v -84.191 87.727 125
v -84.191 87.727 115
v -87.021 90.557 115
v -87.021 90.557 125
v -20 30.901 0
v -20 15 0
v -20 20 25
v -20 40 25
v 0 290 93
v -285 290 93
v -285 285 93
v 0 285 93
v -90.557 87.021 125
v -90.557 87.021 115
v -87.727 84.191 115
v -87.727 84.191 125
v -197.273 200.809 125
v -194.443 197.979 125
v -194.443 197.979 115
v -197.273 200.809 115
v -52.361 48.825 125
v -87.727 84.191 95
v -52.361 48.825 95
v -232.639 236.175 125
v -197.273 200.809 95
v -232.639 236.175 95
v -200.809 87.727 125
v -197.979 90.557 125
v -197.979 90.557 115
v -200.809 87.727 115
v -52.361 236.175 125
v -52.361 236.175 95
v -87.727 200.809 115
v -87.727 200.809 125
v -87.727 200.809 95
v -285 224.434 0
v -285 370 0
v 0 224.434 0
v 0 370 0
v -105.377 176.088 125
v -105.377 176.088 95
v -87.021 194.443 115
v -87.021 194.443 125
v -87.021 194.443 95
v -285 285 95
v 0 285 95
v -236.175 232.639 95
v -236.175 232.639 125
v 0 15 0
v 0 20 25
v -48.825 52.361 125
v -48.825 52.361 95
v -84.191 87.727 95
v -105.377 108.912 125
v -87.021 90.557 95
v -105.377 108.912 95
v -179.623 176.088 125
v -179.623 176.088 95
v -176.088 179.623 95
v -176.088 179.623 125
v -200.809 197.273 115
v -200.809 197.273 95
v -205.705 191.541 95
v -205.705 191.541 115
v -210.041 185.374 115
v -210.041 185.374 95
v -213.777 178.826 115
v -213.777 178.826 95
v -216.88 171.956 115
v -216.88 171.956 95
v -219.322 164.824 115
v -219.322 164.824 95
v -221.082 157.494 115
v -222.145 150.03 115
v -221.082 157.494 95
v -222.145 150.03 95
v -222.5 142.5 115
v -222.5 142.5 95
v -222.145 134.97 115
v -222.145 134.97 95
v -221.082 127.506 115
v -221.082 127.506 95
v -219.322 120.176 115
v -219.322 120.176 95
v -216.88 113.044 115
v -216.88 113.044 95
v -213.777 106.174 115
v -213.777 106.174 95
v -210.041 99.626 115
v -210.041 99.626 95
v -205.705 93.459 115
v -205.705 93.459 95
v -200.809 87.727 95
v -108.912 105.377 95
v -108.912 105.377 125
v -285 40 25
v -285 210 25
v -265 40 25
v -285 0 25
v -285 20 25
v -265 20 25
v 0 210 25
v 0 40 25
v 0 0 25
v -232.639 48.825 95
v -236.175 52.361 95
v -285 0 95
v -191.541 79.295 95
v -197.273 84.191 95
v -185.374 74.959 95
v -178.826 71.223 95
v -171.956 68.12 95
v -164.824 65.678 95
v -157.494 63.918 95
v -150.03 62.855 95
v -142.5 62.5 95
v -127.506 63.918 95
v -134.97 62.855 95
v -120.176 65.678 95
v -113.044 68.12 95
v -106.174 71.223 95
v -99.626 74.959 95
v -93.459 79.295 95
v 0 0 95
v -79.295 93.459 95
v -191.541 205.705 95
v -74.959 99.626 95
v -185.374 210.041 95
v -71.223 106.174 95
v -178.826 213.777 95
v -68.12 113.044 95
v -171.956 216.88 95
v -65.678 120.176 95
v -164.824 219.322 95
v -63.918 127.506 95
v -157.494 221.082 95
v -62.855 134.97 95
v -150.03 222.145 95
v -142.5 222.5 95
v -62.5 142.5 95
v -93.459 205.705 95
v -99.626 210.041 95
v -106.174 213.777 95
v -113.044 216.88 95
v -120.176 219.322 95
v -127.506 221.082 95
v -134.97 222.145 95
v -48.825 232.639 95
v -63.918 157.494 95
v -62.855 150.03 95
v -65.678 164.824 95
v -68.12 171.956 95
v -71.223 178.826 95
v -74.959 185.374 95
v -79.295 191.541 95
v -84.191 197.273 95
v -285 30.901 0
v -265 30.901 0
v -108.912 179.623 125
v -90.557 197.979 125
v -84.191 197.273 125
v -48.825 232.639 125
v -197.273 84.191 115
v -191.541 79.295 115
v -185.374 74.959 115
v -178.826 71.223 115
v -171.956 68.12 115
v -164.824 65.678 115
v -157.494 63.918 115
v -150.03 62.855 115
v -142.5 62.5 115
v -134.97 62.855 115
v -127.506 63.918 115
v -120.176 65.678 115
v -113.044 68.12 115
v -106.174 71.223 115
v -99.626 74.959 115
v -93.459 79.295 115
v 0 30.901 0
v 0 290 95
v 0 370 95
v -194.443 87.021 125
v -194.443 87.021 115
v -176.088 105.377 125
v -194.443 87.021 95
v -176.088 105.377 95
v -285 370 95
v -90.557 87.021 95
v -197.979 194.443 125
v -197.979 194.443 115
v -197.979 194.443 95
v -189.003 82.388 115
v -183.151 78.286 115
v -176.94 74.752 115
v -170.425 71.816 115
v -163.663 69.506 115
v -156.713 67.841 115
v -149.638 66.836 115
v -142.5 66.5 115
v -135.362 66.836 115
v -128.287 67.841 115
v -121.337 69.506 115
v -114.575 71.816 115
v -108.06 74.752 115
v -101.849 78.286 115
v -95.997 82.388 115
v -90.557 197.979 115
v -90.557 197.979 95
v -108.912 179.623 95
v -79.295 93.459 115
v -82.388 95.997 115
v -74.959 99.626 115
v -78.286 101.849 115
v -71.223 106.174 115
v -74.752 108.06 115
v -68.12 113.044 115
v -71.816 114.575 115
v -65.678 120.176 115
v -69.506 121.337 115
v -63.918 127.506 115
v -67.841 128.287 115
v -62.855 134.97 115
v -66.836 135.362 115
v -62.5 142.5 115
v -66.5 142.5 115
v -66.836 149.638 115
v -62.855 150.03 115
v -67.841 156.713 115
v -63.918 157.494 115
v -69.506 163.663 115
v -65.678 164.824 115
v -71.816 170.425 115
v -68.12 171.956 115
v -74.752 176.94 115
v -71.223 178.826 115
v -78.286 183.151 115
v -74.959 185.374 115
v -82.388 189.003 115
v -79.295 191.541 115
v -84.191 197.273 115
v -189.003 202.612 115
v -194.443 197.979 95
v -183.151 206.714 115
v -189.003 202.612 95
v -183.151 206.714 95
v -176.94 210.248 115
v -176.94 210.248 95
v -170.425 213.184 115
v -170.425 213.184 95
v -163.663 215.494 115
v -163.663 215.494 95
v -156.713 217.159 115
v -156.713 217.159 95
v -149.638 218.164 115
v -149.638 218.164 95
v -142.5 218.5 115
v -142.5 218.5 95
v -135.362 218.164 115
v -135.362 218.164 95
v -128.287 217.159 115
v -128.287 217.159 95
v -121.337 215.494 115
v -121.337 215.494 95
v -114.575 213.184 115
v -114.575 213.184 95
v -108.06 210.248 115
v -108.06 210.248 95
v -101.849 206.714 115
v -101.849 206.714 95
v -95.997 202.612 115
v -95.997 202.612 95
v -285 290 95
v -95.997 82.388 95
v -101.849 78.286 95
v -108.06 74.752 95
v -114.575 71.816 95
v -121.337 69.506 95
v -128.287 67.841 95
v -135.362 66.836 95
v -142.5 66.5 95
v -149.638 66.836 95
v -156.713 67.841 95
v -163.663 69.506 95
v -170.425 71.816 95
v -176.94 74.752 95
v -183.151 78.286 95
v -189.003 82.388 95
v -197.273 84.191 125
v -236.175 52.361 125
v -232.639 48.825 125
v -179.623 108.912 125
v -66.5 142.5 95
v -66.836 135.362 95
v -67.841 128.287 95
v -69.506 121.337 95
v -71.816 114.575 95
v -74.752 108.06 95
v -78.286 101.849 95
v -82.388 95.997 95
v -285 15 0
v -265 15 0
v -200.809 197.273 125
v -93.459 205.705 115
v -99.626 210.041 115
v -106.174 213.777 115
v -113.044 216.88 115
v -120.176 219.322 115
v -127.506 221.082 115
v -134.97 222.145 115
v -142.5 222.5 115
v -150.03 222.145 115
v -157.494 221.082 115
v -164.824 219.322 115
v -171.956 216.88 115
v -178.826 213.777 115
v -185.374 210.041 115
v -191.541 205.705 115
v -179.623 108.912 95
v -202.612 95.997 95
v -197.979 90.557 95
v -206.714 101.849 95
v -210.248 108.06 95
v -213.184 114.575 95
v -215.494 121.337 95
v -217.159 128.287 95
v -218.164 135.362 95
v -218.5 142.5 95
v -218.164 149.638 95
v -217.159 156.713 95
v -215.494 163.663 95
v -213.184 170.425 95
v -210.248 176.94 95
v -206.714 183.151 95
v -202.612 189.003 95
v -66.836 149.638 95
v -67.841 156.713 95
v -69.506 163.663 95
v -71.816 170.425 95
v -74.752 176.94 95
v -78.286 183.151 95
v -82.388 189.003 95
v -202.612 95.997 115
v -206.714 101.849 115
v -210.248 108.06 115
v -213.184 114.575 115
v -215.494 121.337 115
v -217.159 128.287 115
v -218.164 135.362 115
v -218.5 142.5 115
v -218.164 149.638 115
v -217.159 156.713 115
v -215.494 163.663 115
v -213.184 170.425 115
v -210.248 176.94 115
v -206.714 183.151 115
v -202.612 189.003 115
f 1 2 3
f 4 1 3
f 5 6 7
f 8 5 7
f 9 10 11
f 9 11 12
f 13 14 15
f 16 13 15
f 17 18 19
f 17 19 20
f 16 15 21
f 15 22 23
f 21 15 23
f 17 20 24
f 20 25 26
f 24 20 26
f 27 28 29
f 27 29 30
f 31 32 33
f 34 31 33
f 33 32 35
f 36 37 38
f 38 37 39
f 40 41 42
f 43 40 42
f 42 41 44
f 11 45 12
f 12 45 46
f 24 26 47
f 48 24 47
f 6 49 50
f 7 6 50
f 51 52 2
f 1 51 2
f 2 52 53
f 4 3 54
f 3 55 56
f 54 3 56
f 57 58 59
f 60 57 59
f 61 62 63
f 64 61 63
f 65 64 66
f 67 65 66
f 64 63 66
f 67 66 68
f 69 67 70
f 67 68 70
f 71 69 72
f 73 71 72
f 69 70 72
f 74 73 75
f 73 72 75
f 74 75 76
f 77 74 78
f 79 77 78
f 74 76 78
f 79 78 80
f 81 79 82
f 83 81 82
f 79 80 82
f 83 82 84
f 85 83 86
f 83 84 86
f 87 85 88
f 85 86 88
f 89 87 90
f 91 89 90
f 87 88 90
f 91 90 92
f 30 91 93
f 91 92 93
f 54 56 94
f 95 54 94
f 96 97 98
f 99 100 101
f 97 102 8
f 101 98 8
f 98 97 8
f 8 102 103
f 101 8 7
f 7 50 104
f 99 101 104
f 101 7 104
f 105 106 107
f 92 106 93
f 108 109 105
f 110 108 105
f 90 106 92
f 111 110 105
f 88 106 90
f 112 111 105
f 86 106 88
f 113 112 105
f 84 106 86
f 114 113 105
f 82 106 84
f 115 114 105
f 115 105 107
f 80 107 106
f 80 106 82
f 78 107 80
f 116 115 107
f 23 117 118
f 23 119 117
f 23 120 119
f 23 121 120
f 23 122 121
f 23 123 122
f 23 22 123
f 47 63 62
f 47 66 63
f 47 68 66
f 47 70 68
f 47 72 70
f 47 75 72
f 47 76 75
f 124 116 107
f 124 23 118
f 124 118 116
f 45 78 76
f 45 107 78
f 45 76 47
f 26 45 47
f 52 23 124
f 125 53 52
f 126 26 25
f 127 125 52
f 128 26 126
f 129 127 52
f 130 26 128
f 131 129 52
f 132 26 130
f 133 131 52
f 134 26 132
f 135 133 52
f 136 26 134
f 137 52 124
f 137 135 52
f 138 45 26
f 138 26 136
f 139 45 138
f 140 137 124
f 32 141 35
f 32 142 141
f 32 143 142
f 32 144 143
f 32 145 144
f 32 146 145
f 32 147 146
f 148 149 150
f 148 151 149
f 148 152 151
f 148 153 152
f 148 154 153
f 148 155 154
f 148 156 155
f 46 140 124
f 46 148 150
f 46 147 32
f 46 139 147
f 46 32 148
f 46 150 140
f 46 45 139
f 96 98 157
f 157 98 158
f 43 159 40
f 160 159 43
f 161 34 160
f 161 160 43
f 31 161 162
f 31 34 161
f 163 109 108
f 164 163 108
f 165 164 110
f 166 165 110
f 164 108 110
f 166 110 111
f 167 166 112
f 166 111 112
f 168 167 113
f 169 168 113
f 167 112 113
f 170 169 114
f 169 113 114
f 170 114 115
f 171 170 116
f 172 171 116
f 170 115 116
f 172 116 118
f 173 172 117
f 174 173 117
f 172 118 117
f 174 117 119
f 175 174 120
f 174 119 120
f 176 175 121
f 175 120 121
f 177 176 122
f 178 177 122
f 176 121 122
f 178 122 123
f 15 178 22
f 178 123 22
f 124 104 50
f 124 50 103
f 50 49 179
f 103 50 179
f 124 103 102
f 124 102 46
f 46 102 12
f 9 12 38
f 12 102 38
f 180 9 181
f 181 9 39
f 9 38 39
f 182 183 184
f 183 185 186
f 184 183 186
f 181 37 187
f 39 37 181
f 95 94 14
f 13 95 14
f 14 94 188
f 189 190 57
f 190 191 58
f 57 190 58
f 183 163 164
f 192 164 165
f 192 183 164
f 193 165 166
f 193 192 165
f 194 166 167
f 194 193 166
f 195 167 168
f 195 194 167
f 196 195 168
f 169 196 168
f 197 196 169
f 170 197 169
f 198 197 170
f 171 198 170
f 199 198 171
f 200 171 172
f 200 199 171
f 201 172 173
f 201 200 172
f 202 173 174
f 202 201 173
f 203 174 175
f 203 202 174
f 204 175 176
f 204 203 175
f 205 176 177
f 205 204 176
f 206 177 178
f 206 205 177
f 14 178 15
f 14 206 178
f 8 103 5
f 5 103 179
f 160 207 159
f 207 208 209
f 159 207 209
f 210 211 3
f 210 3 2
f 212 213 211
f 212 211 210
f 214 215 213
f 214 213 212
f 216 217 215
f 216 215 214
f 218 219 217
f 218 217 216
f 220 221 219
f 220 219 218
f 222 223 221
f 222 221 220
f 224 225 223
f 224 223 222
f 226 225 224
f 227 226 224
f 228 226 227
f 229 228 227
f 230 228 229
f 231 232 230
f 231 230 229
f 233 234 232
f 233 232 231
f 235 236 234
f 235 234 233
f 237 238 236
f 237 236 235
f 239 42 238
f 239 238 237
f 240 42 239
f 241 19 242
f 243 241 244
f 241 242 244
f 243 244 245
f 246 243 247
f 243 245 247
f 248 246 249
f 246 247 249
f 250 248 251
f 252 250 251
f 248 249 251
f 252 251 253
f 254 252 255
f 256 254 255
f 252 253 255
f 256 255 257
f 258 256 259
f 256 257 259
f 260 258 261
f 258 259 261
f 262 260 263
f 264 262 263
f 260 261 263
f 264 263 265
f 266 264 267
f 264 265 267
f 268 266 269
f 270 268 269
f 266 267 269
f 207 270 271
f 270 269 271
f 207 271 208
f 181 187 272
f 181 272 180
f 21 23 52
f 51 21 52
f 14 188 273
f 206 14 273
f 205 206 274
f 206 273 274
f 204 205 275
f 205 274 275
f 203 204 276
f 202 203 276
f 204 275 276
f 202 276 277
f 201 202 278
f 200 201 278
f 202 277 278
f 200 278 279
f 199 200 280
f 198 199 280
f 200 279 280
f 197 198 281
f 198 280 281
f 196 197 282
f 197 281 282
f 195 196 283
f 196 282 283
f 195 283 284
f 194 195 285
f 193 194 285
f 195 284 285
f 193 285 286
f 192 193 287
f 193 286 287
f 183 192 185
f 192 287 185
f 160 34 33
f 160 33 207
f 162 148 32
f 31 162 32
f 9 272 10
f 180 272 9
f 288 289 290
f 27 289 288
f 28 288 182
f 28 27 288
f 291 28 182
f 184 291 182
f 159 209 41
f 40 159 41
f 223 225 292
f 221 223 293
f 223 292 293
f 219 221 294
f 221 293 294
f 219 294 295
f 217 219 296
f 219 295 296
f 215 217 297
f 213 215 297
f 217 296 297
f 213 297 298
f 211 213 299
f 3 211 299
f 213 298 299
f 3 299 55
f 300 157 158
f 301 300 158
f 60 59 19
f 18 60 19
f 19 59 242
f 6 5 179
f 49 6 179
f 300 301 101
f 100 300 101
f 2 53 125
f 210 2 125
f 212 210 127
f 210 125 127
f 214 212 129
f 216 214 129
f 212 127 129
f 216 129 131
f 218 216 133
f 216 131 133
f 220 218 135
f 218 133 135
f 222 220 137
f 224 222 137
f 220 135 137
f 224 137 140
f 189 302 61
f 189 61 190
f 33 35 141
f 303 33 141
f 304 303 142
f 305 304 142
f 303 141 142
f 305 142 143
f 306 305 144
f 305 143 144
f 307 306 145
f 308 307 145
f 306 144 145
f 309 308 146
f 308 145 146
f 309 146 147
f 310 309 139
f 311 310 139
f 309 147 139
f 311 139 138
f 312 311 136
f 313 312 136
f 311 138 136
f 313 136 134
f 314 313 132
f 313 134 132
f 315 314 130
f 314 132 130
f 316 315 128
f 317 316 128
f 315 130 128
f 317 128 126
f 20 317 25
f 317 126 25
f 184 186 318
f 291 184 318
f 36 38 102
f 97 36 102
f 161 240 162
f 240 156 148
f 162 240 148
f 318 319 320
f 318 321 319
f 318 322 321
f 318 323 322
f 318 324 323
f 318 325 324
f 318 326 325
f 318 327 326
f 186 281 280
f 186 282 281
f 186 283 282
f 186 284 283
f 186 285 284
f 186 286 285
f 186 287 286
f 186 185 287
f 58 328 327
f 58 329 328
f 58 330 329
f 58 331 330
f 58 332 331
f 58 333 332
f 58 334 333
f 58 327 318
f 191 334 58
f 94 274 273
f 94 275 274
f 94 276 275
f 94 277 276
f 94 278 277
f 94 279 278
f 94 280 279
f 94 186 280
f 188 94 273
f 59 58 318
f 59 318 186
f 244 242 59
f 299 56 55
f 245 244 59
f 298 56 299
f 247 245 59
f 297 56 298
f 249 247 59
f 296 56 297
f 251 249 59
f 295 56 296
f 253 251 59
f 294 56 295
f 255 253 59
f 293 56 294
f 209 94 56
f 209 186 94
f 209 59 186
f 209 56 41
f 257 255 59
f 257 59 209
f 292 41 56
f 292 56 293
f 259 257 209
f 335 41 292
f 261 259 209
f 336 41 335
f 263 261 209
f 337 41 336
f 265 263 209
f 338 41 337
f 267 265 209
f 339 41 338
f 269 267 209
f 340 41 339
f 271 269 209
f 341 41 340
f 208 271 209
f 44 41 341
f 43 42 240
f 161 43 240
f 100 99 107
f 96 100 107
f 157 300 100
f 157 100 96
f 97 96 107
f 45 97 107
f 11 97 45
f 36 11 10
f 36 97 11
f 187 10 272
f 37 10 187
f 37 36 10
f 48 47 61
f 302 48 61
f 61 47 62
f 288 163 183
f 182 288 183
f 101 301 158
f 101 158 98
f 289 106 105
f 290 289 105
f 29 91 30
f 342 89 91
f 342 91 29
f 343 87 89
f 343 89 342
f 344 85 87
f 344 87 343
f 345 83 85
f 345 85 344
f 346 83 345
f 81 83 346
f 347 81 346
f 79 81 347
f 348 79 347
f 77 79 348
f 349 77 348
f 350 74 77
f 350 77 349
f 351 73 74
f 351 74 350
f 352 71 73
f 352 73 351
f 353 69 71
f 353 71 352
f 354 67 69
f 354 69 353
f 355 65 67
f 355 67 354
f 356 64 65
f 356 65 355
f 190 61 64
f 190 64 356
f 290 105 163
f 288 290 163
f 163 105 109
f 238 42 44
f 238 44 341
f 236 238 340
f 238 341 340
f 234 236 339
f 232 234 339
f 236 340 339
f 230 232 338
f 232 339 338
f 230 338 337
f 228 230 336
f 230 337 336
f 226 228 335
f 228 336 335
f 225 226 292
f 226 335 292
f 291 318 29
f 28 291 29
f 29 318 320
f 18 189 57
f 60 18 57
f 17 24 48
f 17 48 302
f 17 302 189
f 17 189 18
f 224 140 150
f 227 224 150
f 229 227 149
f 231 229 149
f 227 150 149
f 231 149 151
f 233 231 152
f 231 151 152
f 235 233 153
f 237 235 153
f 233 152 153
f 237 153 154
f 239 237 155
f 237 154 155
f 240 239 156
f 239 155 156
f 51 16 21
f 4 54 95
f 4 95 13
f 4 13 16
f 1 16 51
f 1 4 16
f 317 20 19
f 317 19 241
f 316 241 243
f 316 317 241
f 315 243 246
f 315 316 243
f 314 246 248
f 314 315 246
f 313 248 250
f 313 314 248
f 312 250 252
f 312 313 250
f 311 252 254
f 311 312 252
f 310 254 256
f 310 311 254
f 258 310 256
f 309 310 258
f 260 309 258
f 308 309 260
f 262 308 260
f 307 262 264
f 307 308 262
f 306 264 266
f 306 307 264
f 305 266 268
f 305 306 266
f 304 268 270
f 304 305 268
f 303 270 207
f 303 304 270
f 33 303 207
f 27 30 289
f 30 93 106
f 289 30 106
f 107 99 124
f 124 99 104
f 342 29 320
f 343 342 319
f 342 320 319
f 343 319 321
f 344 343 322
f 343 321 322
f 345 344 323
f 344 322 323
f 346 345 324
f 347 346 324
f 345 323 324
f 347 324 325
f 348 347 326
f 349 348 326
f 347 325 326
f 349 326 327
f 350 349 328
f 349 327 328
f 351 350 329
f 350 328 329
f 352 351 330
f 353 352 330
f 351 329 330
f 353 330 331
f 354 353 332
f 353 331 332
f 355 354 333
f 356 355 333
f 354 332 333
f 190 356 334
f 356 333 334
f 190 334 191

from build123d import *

# Parameters (mm, degrees)
F0_W      = 285
F0_H      = 370
F1_DEPTH  = 95
F2_W      = 285
F2_H      = 5
F3_DEPTH  = 2
F5_DEPTH  = 30
F6_DEPTH  = 20
F8_DEPTH  = 406
F9_W      = 245
F9_H      = 25
F10_DEPTH = 81


with BuildPart() as f1:
    # F0 (on Top) → F1 (new body)
    with BuildSketch(Plane.XY):
        with Locations((-142.5, 185)):
            Rectangle(F0_W, F0_H)
    extrude(amount=F1_DEPTH)

    # F2 (on face) → F3 (cut)
    with BuildSketch(Plane.XY.offset(95)):
        with Locations((-142.5, 287.5)):
            Rectangle(F2_W, F2_H)
    extrude(amount=-F3_DEPTH, mode=Mode.SUBTRACT)

    # F4 (on face) → F5 (join)
    with BuildSketch(Plane.XY.offset(95)):
        with BuildLine():
            Line((-232.6391152703, 48.8253508238), (-197.2731474365, 84.1913186575))
            ThreePointArc((-197.2731474365, 84.1913186575), (-199.0685424949, 85.9314575051), (-200.8086813425, 87.7268525635))
            Line((-200.8086813425, 87.7268525635), (-236.1746491762, 52.3608847297))
            Line((-236.1746491762, 52.3608847297), (-232.6391152703, 48.8253508238))
        make_face()
        with BuildLine():
            ThreePointArc((-200.8086813425, 87.7268525635), (-199.0685424949, 85.9314575051), (-197.2731474365, 84.1913186575))
            Line((-197.2731474365, 84.1913186575), (-194.4432654333, 87.0212006608))
            ThreePointArc((-194.4432654333, 87.0212006608), (-196.2401153702, 88.7598846298), (-197.9787993392, 90.5567345667))
            Line((-197.9787993392, 90.5567345667), (-200.8086813425, 87.7268525635))
        make_face()
        with BuildLine():
            ThreePointArc((-197.9787993392, 90.5567345667), (-196.2401153702, 88.7598846298), (-194.4432654333, 87.0212006608))
            Line((-194.4432654333, 87.0212006608), (-176.0875721064, 105.3768939877))
            Line((-176.0875721064, 105.3768939877), (-179.6231060123, 108.9124278936))
            Line((-179.6231060123, 108.9124278936), (-197.9787993392, 90.5567345667))
        make_face()
        with BuildLine():
            ThreePointArc((-90.5567345667, 87.0212006608), (-88.7598846298, 88.7598846298), (-87.0212006608, 90.5567345667))
            Line((-87.0212006608, 90.5567345667), (-105.3768939877, 108.9124278936))
            Line((-105.3768939877, 108.9124278936), (-108.9124278936, 105.3768939877))
            Line((-108.9124278936, 105.3768939877), (-90.5567345667, 87.0212006608))
        make_face()
        with BuildLine():
            ThreePointArc((-87.7268525635, 84.1913186575), (-85.9314575051, 85.9314575051), (-84.1913186575, 87.7268525635))
            Line((-84.1913186575, 87.7268525635), (-87.0212006608, 90.5567345667))
            ThreePointArc((-87.0212006608, 90.5567345667), (-88.7598846298, 88.7598846298), (-90.5567345667, 87.0212006608))
            Line((-90.5567345667, 87.0212006608), (-87.7268525635, 84.1913186575))
        make_face()
        with BuildLine():
            Line((-48.8253508238, 52.3608847297), (-84.1913186575, 87.7268525635))
            ThreePointArc((-84.1913186575, 87.7268525635), (-85.9314575051, 85.9314575051), (-87.7268525635, 84.1913186575))
            Line((-87.7268525635, 84.1913186575), (-52.3608847297, 48.8253508238))
            Line((-52.3608847297, 48.8253508238), (-48.8253508238, 52.3608847297))
        make_face()
        with BuildLine():
            ThreePointArc((-200.8086813425, 197.2731474365), (-199.0685424949, 199.0685424949), (-197.2731474365, 200.8086813425))
            Line((-197.2731474365, 200.8086813425), (-232.6391152703, 236.1746491762))
            Line((-232.6391152703, 236.1746491762), (-236.1746491762, 232.6391152703))
            Line((-236.1746491762, 232.6391152703), (-200.8086813425, 197.2731474365))
        make_face()
        with BuildLine():
            Line((-194.4432654333, 197.9787993392), (-197.2731474365, 200.8086813425))
            ThreePointArc((-197.2731474365, 200.8086813425), (-199.0685424949, 199.0685424949), (-200.8086813425, 197.2731474365))
            Line((-200.8086813425, 197.2731474365), (-197.9787993392, 194.4432654333))
            ThreePointArc((-197.9787993392, 194.4432654333), (-196.2401153702, 196.2401153702), (-194.4432654333, 197.9787993392))
        make_face()
        with BuildLine():
            Line((-176.0875721064, 179.6231060123), (-194.4432654333, 197.9787993392))
            ThreePointArc((-194.4432654333, 197.9787993392), (-196.2401153702, 196.2401153702), (-197.9787993392, 194.4432654333))
            Line((-197.9787993392, 194.4432654333), (-179.6231060123, 176.0875721064))
            Line((-179.6231060123, 176.0875721064), (-176.0875721064, 179.6231060123))
        make_face()
        with BuildLine():
            ThreePointArc((-87.7268525635, 200.8086813425), (-85.9314575051, 199.0685424949), (-84.1913186575, 197.2731474365))
            Line((-84.1913186575, 197.2731474365), (-48.8253508238, 232.6391152703))
            Line((-48.8253508238, 232.6391152703), (-52.3608847297, 236.1746491762))
            Line((-52.3608847297, 236.1746491762), (-87.7268525635, 200.8086813425))
        make_face()
        with BuildLine():
            Line((-87.0212006608, 194.4432654333), (-84.1913186575, 197.2731474365))
            ThreePointArc((-84.1913186575, 197.2731474365), (-85.9314575051, 199.0685424949), (-87.7268525635, 200.8086813425))
            Line((-87.7268525635, 200.8086813425), (-90.5567345667, 197.9787993392))
            ThreePointArc((-90.5567345667, 197.9787993392), (-88.7598846298, 196.2401153702), (-87.0212006608, 194.4432654333))
        make_face()
        with BuildLine():
            Line((-105.3768939877, 176.0875721064), (-87.0212006608, 194.4432654333))
            ThreePointArc((-87.0212006608, 194.4432654333), (-88.7598846298, 196.2401153702), (-90.5567345667, 197.9787993392))
            Line((-90.5567345667, 197.9787993392), (-108.9124278936, 179.6231060123))
            Line((-108.9124278936, 179.6231060123), (-105.3768939877, 176.0875721064))
        make_face()
    extrude(amount=F5_DEPTH)

    # F4 (on face) → F6 (join)
    with BuildSketch(Plane.XY.offset(95)):
        with BuildLine():
            ThreePointArc((-197.2731474365, 84.1913186575), (-142.5, 62.5), (-87.7268525635, 84.1913186575))
            Line((-87.7268525635, 84.1913186575), (-90.5567345667, 87.0212006608))
            ThreePointArc((-90.5567345667, 87.0212006608), (-142.5, 66.5), (-194.4432654333, 87.0212006608))
            Line((-194.4432654333, 87.0212006608), (-197.2731474365, 84.1913186575))
        make_face()
        with BuildLine():
            Line((-197.9787993392, 194.4432654333), (-200.8086813425, 197.2731474365))
            ThreePointArc((-200.8086813425, 197.2731474365), (-222.5, 142.5), (-200.8086813425, 87.7268525635))
            Line((-200.8086813425, 87.7268525635), (-197.9787993392, 90.5567345667))
            ThreePointArc((-197.9787993392, 90.5567345667), (-218.5, 142.5), (-197.9787993392, 194.4432654333))
        make_face()
        with BuildLine():
            Line((-90.5567345667, 197.9787993392), (-87.7268525635, 200.8086813425))
            ThreePointArc((-87.7268525635, 200.8086813425), (-142.5, 222.5), (-197.2731474365, 200.8086813425))
            Line((-197.2731474365, 200.8086813425), (-194.4432654333, 197.9787993392))
            ThreePointArc((-194.4432654333, 197.9787993392), (-142.5, 218.5), (-90.5567345667, 197.9787993392))
        make_face()
        with BuildLine():
            ThreePointArc((-84.1913186575, 87.7268525635), (-68.1202497067, 113.0440541435), (-62.5, 142.5))
            ThreePointArc((-62.5, 142.5), (-68.1202497067, 171.9559458565), (-84.1913186575, 197.2731474365))
            Line((-84.1913186575, 197.2731474365), (-87.0212006608, 194.4432654333))
            ThreePointArc((-87.0212006608, 194.4432654333), (-71.8162368369, 170.4250000019), (-66.5, 142.5))
            ThreePointArc((-66.5, 142.5), (-71.8162368369, 114.5749999981), (-87.0212006608, 90.5567345667))
            Line((-87.0212006608, 90.5567345667), (-84.1913186575, 87.7268525635))
        make_face()
    extrude(amount=F6_DEPTH)

    # F7 (on face) → F8 (cut)
    with BuildSketch(Plane.YZ):
        Polygon((0, 0), (15, 0), (20, 25), (0, 25), align=None)
        Polygon((40, 25), (30.9007441433, 0), (224.4337567297, 0), (210, 25), align=None)
    extrude(amount=-F8_DEPTH, mode=Mode.SUBTRACT)

    # F9 (on face) → F10 (cut)
    with BuildSketch(Plane.XZ):
        with Locations((-142.5, 12.5)):
            Rectangle(F9_W, F9_H)
    extrude(amount=-F10_DEPTH, mode=Mode.SUBTRACT)


solid = f1.part
